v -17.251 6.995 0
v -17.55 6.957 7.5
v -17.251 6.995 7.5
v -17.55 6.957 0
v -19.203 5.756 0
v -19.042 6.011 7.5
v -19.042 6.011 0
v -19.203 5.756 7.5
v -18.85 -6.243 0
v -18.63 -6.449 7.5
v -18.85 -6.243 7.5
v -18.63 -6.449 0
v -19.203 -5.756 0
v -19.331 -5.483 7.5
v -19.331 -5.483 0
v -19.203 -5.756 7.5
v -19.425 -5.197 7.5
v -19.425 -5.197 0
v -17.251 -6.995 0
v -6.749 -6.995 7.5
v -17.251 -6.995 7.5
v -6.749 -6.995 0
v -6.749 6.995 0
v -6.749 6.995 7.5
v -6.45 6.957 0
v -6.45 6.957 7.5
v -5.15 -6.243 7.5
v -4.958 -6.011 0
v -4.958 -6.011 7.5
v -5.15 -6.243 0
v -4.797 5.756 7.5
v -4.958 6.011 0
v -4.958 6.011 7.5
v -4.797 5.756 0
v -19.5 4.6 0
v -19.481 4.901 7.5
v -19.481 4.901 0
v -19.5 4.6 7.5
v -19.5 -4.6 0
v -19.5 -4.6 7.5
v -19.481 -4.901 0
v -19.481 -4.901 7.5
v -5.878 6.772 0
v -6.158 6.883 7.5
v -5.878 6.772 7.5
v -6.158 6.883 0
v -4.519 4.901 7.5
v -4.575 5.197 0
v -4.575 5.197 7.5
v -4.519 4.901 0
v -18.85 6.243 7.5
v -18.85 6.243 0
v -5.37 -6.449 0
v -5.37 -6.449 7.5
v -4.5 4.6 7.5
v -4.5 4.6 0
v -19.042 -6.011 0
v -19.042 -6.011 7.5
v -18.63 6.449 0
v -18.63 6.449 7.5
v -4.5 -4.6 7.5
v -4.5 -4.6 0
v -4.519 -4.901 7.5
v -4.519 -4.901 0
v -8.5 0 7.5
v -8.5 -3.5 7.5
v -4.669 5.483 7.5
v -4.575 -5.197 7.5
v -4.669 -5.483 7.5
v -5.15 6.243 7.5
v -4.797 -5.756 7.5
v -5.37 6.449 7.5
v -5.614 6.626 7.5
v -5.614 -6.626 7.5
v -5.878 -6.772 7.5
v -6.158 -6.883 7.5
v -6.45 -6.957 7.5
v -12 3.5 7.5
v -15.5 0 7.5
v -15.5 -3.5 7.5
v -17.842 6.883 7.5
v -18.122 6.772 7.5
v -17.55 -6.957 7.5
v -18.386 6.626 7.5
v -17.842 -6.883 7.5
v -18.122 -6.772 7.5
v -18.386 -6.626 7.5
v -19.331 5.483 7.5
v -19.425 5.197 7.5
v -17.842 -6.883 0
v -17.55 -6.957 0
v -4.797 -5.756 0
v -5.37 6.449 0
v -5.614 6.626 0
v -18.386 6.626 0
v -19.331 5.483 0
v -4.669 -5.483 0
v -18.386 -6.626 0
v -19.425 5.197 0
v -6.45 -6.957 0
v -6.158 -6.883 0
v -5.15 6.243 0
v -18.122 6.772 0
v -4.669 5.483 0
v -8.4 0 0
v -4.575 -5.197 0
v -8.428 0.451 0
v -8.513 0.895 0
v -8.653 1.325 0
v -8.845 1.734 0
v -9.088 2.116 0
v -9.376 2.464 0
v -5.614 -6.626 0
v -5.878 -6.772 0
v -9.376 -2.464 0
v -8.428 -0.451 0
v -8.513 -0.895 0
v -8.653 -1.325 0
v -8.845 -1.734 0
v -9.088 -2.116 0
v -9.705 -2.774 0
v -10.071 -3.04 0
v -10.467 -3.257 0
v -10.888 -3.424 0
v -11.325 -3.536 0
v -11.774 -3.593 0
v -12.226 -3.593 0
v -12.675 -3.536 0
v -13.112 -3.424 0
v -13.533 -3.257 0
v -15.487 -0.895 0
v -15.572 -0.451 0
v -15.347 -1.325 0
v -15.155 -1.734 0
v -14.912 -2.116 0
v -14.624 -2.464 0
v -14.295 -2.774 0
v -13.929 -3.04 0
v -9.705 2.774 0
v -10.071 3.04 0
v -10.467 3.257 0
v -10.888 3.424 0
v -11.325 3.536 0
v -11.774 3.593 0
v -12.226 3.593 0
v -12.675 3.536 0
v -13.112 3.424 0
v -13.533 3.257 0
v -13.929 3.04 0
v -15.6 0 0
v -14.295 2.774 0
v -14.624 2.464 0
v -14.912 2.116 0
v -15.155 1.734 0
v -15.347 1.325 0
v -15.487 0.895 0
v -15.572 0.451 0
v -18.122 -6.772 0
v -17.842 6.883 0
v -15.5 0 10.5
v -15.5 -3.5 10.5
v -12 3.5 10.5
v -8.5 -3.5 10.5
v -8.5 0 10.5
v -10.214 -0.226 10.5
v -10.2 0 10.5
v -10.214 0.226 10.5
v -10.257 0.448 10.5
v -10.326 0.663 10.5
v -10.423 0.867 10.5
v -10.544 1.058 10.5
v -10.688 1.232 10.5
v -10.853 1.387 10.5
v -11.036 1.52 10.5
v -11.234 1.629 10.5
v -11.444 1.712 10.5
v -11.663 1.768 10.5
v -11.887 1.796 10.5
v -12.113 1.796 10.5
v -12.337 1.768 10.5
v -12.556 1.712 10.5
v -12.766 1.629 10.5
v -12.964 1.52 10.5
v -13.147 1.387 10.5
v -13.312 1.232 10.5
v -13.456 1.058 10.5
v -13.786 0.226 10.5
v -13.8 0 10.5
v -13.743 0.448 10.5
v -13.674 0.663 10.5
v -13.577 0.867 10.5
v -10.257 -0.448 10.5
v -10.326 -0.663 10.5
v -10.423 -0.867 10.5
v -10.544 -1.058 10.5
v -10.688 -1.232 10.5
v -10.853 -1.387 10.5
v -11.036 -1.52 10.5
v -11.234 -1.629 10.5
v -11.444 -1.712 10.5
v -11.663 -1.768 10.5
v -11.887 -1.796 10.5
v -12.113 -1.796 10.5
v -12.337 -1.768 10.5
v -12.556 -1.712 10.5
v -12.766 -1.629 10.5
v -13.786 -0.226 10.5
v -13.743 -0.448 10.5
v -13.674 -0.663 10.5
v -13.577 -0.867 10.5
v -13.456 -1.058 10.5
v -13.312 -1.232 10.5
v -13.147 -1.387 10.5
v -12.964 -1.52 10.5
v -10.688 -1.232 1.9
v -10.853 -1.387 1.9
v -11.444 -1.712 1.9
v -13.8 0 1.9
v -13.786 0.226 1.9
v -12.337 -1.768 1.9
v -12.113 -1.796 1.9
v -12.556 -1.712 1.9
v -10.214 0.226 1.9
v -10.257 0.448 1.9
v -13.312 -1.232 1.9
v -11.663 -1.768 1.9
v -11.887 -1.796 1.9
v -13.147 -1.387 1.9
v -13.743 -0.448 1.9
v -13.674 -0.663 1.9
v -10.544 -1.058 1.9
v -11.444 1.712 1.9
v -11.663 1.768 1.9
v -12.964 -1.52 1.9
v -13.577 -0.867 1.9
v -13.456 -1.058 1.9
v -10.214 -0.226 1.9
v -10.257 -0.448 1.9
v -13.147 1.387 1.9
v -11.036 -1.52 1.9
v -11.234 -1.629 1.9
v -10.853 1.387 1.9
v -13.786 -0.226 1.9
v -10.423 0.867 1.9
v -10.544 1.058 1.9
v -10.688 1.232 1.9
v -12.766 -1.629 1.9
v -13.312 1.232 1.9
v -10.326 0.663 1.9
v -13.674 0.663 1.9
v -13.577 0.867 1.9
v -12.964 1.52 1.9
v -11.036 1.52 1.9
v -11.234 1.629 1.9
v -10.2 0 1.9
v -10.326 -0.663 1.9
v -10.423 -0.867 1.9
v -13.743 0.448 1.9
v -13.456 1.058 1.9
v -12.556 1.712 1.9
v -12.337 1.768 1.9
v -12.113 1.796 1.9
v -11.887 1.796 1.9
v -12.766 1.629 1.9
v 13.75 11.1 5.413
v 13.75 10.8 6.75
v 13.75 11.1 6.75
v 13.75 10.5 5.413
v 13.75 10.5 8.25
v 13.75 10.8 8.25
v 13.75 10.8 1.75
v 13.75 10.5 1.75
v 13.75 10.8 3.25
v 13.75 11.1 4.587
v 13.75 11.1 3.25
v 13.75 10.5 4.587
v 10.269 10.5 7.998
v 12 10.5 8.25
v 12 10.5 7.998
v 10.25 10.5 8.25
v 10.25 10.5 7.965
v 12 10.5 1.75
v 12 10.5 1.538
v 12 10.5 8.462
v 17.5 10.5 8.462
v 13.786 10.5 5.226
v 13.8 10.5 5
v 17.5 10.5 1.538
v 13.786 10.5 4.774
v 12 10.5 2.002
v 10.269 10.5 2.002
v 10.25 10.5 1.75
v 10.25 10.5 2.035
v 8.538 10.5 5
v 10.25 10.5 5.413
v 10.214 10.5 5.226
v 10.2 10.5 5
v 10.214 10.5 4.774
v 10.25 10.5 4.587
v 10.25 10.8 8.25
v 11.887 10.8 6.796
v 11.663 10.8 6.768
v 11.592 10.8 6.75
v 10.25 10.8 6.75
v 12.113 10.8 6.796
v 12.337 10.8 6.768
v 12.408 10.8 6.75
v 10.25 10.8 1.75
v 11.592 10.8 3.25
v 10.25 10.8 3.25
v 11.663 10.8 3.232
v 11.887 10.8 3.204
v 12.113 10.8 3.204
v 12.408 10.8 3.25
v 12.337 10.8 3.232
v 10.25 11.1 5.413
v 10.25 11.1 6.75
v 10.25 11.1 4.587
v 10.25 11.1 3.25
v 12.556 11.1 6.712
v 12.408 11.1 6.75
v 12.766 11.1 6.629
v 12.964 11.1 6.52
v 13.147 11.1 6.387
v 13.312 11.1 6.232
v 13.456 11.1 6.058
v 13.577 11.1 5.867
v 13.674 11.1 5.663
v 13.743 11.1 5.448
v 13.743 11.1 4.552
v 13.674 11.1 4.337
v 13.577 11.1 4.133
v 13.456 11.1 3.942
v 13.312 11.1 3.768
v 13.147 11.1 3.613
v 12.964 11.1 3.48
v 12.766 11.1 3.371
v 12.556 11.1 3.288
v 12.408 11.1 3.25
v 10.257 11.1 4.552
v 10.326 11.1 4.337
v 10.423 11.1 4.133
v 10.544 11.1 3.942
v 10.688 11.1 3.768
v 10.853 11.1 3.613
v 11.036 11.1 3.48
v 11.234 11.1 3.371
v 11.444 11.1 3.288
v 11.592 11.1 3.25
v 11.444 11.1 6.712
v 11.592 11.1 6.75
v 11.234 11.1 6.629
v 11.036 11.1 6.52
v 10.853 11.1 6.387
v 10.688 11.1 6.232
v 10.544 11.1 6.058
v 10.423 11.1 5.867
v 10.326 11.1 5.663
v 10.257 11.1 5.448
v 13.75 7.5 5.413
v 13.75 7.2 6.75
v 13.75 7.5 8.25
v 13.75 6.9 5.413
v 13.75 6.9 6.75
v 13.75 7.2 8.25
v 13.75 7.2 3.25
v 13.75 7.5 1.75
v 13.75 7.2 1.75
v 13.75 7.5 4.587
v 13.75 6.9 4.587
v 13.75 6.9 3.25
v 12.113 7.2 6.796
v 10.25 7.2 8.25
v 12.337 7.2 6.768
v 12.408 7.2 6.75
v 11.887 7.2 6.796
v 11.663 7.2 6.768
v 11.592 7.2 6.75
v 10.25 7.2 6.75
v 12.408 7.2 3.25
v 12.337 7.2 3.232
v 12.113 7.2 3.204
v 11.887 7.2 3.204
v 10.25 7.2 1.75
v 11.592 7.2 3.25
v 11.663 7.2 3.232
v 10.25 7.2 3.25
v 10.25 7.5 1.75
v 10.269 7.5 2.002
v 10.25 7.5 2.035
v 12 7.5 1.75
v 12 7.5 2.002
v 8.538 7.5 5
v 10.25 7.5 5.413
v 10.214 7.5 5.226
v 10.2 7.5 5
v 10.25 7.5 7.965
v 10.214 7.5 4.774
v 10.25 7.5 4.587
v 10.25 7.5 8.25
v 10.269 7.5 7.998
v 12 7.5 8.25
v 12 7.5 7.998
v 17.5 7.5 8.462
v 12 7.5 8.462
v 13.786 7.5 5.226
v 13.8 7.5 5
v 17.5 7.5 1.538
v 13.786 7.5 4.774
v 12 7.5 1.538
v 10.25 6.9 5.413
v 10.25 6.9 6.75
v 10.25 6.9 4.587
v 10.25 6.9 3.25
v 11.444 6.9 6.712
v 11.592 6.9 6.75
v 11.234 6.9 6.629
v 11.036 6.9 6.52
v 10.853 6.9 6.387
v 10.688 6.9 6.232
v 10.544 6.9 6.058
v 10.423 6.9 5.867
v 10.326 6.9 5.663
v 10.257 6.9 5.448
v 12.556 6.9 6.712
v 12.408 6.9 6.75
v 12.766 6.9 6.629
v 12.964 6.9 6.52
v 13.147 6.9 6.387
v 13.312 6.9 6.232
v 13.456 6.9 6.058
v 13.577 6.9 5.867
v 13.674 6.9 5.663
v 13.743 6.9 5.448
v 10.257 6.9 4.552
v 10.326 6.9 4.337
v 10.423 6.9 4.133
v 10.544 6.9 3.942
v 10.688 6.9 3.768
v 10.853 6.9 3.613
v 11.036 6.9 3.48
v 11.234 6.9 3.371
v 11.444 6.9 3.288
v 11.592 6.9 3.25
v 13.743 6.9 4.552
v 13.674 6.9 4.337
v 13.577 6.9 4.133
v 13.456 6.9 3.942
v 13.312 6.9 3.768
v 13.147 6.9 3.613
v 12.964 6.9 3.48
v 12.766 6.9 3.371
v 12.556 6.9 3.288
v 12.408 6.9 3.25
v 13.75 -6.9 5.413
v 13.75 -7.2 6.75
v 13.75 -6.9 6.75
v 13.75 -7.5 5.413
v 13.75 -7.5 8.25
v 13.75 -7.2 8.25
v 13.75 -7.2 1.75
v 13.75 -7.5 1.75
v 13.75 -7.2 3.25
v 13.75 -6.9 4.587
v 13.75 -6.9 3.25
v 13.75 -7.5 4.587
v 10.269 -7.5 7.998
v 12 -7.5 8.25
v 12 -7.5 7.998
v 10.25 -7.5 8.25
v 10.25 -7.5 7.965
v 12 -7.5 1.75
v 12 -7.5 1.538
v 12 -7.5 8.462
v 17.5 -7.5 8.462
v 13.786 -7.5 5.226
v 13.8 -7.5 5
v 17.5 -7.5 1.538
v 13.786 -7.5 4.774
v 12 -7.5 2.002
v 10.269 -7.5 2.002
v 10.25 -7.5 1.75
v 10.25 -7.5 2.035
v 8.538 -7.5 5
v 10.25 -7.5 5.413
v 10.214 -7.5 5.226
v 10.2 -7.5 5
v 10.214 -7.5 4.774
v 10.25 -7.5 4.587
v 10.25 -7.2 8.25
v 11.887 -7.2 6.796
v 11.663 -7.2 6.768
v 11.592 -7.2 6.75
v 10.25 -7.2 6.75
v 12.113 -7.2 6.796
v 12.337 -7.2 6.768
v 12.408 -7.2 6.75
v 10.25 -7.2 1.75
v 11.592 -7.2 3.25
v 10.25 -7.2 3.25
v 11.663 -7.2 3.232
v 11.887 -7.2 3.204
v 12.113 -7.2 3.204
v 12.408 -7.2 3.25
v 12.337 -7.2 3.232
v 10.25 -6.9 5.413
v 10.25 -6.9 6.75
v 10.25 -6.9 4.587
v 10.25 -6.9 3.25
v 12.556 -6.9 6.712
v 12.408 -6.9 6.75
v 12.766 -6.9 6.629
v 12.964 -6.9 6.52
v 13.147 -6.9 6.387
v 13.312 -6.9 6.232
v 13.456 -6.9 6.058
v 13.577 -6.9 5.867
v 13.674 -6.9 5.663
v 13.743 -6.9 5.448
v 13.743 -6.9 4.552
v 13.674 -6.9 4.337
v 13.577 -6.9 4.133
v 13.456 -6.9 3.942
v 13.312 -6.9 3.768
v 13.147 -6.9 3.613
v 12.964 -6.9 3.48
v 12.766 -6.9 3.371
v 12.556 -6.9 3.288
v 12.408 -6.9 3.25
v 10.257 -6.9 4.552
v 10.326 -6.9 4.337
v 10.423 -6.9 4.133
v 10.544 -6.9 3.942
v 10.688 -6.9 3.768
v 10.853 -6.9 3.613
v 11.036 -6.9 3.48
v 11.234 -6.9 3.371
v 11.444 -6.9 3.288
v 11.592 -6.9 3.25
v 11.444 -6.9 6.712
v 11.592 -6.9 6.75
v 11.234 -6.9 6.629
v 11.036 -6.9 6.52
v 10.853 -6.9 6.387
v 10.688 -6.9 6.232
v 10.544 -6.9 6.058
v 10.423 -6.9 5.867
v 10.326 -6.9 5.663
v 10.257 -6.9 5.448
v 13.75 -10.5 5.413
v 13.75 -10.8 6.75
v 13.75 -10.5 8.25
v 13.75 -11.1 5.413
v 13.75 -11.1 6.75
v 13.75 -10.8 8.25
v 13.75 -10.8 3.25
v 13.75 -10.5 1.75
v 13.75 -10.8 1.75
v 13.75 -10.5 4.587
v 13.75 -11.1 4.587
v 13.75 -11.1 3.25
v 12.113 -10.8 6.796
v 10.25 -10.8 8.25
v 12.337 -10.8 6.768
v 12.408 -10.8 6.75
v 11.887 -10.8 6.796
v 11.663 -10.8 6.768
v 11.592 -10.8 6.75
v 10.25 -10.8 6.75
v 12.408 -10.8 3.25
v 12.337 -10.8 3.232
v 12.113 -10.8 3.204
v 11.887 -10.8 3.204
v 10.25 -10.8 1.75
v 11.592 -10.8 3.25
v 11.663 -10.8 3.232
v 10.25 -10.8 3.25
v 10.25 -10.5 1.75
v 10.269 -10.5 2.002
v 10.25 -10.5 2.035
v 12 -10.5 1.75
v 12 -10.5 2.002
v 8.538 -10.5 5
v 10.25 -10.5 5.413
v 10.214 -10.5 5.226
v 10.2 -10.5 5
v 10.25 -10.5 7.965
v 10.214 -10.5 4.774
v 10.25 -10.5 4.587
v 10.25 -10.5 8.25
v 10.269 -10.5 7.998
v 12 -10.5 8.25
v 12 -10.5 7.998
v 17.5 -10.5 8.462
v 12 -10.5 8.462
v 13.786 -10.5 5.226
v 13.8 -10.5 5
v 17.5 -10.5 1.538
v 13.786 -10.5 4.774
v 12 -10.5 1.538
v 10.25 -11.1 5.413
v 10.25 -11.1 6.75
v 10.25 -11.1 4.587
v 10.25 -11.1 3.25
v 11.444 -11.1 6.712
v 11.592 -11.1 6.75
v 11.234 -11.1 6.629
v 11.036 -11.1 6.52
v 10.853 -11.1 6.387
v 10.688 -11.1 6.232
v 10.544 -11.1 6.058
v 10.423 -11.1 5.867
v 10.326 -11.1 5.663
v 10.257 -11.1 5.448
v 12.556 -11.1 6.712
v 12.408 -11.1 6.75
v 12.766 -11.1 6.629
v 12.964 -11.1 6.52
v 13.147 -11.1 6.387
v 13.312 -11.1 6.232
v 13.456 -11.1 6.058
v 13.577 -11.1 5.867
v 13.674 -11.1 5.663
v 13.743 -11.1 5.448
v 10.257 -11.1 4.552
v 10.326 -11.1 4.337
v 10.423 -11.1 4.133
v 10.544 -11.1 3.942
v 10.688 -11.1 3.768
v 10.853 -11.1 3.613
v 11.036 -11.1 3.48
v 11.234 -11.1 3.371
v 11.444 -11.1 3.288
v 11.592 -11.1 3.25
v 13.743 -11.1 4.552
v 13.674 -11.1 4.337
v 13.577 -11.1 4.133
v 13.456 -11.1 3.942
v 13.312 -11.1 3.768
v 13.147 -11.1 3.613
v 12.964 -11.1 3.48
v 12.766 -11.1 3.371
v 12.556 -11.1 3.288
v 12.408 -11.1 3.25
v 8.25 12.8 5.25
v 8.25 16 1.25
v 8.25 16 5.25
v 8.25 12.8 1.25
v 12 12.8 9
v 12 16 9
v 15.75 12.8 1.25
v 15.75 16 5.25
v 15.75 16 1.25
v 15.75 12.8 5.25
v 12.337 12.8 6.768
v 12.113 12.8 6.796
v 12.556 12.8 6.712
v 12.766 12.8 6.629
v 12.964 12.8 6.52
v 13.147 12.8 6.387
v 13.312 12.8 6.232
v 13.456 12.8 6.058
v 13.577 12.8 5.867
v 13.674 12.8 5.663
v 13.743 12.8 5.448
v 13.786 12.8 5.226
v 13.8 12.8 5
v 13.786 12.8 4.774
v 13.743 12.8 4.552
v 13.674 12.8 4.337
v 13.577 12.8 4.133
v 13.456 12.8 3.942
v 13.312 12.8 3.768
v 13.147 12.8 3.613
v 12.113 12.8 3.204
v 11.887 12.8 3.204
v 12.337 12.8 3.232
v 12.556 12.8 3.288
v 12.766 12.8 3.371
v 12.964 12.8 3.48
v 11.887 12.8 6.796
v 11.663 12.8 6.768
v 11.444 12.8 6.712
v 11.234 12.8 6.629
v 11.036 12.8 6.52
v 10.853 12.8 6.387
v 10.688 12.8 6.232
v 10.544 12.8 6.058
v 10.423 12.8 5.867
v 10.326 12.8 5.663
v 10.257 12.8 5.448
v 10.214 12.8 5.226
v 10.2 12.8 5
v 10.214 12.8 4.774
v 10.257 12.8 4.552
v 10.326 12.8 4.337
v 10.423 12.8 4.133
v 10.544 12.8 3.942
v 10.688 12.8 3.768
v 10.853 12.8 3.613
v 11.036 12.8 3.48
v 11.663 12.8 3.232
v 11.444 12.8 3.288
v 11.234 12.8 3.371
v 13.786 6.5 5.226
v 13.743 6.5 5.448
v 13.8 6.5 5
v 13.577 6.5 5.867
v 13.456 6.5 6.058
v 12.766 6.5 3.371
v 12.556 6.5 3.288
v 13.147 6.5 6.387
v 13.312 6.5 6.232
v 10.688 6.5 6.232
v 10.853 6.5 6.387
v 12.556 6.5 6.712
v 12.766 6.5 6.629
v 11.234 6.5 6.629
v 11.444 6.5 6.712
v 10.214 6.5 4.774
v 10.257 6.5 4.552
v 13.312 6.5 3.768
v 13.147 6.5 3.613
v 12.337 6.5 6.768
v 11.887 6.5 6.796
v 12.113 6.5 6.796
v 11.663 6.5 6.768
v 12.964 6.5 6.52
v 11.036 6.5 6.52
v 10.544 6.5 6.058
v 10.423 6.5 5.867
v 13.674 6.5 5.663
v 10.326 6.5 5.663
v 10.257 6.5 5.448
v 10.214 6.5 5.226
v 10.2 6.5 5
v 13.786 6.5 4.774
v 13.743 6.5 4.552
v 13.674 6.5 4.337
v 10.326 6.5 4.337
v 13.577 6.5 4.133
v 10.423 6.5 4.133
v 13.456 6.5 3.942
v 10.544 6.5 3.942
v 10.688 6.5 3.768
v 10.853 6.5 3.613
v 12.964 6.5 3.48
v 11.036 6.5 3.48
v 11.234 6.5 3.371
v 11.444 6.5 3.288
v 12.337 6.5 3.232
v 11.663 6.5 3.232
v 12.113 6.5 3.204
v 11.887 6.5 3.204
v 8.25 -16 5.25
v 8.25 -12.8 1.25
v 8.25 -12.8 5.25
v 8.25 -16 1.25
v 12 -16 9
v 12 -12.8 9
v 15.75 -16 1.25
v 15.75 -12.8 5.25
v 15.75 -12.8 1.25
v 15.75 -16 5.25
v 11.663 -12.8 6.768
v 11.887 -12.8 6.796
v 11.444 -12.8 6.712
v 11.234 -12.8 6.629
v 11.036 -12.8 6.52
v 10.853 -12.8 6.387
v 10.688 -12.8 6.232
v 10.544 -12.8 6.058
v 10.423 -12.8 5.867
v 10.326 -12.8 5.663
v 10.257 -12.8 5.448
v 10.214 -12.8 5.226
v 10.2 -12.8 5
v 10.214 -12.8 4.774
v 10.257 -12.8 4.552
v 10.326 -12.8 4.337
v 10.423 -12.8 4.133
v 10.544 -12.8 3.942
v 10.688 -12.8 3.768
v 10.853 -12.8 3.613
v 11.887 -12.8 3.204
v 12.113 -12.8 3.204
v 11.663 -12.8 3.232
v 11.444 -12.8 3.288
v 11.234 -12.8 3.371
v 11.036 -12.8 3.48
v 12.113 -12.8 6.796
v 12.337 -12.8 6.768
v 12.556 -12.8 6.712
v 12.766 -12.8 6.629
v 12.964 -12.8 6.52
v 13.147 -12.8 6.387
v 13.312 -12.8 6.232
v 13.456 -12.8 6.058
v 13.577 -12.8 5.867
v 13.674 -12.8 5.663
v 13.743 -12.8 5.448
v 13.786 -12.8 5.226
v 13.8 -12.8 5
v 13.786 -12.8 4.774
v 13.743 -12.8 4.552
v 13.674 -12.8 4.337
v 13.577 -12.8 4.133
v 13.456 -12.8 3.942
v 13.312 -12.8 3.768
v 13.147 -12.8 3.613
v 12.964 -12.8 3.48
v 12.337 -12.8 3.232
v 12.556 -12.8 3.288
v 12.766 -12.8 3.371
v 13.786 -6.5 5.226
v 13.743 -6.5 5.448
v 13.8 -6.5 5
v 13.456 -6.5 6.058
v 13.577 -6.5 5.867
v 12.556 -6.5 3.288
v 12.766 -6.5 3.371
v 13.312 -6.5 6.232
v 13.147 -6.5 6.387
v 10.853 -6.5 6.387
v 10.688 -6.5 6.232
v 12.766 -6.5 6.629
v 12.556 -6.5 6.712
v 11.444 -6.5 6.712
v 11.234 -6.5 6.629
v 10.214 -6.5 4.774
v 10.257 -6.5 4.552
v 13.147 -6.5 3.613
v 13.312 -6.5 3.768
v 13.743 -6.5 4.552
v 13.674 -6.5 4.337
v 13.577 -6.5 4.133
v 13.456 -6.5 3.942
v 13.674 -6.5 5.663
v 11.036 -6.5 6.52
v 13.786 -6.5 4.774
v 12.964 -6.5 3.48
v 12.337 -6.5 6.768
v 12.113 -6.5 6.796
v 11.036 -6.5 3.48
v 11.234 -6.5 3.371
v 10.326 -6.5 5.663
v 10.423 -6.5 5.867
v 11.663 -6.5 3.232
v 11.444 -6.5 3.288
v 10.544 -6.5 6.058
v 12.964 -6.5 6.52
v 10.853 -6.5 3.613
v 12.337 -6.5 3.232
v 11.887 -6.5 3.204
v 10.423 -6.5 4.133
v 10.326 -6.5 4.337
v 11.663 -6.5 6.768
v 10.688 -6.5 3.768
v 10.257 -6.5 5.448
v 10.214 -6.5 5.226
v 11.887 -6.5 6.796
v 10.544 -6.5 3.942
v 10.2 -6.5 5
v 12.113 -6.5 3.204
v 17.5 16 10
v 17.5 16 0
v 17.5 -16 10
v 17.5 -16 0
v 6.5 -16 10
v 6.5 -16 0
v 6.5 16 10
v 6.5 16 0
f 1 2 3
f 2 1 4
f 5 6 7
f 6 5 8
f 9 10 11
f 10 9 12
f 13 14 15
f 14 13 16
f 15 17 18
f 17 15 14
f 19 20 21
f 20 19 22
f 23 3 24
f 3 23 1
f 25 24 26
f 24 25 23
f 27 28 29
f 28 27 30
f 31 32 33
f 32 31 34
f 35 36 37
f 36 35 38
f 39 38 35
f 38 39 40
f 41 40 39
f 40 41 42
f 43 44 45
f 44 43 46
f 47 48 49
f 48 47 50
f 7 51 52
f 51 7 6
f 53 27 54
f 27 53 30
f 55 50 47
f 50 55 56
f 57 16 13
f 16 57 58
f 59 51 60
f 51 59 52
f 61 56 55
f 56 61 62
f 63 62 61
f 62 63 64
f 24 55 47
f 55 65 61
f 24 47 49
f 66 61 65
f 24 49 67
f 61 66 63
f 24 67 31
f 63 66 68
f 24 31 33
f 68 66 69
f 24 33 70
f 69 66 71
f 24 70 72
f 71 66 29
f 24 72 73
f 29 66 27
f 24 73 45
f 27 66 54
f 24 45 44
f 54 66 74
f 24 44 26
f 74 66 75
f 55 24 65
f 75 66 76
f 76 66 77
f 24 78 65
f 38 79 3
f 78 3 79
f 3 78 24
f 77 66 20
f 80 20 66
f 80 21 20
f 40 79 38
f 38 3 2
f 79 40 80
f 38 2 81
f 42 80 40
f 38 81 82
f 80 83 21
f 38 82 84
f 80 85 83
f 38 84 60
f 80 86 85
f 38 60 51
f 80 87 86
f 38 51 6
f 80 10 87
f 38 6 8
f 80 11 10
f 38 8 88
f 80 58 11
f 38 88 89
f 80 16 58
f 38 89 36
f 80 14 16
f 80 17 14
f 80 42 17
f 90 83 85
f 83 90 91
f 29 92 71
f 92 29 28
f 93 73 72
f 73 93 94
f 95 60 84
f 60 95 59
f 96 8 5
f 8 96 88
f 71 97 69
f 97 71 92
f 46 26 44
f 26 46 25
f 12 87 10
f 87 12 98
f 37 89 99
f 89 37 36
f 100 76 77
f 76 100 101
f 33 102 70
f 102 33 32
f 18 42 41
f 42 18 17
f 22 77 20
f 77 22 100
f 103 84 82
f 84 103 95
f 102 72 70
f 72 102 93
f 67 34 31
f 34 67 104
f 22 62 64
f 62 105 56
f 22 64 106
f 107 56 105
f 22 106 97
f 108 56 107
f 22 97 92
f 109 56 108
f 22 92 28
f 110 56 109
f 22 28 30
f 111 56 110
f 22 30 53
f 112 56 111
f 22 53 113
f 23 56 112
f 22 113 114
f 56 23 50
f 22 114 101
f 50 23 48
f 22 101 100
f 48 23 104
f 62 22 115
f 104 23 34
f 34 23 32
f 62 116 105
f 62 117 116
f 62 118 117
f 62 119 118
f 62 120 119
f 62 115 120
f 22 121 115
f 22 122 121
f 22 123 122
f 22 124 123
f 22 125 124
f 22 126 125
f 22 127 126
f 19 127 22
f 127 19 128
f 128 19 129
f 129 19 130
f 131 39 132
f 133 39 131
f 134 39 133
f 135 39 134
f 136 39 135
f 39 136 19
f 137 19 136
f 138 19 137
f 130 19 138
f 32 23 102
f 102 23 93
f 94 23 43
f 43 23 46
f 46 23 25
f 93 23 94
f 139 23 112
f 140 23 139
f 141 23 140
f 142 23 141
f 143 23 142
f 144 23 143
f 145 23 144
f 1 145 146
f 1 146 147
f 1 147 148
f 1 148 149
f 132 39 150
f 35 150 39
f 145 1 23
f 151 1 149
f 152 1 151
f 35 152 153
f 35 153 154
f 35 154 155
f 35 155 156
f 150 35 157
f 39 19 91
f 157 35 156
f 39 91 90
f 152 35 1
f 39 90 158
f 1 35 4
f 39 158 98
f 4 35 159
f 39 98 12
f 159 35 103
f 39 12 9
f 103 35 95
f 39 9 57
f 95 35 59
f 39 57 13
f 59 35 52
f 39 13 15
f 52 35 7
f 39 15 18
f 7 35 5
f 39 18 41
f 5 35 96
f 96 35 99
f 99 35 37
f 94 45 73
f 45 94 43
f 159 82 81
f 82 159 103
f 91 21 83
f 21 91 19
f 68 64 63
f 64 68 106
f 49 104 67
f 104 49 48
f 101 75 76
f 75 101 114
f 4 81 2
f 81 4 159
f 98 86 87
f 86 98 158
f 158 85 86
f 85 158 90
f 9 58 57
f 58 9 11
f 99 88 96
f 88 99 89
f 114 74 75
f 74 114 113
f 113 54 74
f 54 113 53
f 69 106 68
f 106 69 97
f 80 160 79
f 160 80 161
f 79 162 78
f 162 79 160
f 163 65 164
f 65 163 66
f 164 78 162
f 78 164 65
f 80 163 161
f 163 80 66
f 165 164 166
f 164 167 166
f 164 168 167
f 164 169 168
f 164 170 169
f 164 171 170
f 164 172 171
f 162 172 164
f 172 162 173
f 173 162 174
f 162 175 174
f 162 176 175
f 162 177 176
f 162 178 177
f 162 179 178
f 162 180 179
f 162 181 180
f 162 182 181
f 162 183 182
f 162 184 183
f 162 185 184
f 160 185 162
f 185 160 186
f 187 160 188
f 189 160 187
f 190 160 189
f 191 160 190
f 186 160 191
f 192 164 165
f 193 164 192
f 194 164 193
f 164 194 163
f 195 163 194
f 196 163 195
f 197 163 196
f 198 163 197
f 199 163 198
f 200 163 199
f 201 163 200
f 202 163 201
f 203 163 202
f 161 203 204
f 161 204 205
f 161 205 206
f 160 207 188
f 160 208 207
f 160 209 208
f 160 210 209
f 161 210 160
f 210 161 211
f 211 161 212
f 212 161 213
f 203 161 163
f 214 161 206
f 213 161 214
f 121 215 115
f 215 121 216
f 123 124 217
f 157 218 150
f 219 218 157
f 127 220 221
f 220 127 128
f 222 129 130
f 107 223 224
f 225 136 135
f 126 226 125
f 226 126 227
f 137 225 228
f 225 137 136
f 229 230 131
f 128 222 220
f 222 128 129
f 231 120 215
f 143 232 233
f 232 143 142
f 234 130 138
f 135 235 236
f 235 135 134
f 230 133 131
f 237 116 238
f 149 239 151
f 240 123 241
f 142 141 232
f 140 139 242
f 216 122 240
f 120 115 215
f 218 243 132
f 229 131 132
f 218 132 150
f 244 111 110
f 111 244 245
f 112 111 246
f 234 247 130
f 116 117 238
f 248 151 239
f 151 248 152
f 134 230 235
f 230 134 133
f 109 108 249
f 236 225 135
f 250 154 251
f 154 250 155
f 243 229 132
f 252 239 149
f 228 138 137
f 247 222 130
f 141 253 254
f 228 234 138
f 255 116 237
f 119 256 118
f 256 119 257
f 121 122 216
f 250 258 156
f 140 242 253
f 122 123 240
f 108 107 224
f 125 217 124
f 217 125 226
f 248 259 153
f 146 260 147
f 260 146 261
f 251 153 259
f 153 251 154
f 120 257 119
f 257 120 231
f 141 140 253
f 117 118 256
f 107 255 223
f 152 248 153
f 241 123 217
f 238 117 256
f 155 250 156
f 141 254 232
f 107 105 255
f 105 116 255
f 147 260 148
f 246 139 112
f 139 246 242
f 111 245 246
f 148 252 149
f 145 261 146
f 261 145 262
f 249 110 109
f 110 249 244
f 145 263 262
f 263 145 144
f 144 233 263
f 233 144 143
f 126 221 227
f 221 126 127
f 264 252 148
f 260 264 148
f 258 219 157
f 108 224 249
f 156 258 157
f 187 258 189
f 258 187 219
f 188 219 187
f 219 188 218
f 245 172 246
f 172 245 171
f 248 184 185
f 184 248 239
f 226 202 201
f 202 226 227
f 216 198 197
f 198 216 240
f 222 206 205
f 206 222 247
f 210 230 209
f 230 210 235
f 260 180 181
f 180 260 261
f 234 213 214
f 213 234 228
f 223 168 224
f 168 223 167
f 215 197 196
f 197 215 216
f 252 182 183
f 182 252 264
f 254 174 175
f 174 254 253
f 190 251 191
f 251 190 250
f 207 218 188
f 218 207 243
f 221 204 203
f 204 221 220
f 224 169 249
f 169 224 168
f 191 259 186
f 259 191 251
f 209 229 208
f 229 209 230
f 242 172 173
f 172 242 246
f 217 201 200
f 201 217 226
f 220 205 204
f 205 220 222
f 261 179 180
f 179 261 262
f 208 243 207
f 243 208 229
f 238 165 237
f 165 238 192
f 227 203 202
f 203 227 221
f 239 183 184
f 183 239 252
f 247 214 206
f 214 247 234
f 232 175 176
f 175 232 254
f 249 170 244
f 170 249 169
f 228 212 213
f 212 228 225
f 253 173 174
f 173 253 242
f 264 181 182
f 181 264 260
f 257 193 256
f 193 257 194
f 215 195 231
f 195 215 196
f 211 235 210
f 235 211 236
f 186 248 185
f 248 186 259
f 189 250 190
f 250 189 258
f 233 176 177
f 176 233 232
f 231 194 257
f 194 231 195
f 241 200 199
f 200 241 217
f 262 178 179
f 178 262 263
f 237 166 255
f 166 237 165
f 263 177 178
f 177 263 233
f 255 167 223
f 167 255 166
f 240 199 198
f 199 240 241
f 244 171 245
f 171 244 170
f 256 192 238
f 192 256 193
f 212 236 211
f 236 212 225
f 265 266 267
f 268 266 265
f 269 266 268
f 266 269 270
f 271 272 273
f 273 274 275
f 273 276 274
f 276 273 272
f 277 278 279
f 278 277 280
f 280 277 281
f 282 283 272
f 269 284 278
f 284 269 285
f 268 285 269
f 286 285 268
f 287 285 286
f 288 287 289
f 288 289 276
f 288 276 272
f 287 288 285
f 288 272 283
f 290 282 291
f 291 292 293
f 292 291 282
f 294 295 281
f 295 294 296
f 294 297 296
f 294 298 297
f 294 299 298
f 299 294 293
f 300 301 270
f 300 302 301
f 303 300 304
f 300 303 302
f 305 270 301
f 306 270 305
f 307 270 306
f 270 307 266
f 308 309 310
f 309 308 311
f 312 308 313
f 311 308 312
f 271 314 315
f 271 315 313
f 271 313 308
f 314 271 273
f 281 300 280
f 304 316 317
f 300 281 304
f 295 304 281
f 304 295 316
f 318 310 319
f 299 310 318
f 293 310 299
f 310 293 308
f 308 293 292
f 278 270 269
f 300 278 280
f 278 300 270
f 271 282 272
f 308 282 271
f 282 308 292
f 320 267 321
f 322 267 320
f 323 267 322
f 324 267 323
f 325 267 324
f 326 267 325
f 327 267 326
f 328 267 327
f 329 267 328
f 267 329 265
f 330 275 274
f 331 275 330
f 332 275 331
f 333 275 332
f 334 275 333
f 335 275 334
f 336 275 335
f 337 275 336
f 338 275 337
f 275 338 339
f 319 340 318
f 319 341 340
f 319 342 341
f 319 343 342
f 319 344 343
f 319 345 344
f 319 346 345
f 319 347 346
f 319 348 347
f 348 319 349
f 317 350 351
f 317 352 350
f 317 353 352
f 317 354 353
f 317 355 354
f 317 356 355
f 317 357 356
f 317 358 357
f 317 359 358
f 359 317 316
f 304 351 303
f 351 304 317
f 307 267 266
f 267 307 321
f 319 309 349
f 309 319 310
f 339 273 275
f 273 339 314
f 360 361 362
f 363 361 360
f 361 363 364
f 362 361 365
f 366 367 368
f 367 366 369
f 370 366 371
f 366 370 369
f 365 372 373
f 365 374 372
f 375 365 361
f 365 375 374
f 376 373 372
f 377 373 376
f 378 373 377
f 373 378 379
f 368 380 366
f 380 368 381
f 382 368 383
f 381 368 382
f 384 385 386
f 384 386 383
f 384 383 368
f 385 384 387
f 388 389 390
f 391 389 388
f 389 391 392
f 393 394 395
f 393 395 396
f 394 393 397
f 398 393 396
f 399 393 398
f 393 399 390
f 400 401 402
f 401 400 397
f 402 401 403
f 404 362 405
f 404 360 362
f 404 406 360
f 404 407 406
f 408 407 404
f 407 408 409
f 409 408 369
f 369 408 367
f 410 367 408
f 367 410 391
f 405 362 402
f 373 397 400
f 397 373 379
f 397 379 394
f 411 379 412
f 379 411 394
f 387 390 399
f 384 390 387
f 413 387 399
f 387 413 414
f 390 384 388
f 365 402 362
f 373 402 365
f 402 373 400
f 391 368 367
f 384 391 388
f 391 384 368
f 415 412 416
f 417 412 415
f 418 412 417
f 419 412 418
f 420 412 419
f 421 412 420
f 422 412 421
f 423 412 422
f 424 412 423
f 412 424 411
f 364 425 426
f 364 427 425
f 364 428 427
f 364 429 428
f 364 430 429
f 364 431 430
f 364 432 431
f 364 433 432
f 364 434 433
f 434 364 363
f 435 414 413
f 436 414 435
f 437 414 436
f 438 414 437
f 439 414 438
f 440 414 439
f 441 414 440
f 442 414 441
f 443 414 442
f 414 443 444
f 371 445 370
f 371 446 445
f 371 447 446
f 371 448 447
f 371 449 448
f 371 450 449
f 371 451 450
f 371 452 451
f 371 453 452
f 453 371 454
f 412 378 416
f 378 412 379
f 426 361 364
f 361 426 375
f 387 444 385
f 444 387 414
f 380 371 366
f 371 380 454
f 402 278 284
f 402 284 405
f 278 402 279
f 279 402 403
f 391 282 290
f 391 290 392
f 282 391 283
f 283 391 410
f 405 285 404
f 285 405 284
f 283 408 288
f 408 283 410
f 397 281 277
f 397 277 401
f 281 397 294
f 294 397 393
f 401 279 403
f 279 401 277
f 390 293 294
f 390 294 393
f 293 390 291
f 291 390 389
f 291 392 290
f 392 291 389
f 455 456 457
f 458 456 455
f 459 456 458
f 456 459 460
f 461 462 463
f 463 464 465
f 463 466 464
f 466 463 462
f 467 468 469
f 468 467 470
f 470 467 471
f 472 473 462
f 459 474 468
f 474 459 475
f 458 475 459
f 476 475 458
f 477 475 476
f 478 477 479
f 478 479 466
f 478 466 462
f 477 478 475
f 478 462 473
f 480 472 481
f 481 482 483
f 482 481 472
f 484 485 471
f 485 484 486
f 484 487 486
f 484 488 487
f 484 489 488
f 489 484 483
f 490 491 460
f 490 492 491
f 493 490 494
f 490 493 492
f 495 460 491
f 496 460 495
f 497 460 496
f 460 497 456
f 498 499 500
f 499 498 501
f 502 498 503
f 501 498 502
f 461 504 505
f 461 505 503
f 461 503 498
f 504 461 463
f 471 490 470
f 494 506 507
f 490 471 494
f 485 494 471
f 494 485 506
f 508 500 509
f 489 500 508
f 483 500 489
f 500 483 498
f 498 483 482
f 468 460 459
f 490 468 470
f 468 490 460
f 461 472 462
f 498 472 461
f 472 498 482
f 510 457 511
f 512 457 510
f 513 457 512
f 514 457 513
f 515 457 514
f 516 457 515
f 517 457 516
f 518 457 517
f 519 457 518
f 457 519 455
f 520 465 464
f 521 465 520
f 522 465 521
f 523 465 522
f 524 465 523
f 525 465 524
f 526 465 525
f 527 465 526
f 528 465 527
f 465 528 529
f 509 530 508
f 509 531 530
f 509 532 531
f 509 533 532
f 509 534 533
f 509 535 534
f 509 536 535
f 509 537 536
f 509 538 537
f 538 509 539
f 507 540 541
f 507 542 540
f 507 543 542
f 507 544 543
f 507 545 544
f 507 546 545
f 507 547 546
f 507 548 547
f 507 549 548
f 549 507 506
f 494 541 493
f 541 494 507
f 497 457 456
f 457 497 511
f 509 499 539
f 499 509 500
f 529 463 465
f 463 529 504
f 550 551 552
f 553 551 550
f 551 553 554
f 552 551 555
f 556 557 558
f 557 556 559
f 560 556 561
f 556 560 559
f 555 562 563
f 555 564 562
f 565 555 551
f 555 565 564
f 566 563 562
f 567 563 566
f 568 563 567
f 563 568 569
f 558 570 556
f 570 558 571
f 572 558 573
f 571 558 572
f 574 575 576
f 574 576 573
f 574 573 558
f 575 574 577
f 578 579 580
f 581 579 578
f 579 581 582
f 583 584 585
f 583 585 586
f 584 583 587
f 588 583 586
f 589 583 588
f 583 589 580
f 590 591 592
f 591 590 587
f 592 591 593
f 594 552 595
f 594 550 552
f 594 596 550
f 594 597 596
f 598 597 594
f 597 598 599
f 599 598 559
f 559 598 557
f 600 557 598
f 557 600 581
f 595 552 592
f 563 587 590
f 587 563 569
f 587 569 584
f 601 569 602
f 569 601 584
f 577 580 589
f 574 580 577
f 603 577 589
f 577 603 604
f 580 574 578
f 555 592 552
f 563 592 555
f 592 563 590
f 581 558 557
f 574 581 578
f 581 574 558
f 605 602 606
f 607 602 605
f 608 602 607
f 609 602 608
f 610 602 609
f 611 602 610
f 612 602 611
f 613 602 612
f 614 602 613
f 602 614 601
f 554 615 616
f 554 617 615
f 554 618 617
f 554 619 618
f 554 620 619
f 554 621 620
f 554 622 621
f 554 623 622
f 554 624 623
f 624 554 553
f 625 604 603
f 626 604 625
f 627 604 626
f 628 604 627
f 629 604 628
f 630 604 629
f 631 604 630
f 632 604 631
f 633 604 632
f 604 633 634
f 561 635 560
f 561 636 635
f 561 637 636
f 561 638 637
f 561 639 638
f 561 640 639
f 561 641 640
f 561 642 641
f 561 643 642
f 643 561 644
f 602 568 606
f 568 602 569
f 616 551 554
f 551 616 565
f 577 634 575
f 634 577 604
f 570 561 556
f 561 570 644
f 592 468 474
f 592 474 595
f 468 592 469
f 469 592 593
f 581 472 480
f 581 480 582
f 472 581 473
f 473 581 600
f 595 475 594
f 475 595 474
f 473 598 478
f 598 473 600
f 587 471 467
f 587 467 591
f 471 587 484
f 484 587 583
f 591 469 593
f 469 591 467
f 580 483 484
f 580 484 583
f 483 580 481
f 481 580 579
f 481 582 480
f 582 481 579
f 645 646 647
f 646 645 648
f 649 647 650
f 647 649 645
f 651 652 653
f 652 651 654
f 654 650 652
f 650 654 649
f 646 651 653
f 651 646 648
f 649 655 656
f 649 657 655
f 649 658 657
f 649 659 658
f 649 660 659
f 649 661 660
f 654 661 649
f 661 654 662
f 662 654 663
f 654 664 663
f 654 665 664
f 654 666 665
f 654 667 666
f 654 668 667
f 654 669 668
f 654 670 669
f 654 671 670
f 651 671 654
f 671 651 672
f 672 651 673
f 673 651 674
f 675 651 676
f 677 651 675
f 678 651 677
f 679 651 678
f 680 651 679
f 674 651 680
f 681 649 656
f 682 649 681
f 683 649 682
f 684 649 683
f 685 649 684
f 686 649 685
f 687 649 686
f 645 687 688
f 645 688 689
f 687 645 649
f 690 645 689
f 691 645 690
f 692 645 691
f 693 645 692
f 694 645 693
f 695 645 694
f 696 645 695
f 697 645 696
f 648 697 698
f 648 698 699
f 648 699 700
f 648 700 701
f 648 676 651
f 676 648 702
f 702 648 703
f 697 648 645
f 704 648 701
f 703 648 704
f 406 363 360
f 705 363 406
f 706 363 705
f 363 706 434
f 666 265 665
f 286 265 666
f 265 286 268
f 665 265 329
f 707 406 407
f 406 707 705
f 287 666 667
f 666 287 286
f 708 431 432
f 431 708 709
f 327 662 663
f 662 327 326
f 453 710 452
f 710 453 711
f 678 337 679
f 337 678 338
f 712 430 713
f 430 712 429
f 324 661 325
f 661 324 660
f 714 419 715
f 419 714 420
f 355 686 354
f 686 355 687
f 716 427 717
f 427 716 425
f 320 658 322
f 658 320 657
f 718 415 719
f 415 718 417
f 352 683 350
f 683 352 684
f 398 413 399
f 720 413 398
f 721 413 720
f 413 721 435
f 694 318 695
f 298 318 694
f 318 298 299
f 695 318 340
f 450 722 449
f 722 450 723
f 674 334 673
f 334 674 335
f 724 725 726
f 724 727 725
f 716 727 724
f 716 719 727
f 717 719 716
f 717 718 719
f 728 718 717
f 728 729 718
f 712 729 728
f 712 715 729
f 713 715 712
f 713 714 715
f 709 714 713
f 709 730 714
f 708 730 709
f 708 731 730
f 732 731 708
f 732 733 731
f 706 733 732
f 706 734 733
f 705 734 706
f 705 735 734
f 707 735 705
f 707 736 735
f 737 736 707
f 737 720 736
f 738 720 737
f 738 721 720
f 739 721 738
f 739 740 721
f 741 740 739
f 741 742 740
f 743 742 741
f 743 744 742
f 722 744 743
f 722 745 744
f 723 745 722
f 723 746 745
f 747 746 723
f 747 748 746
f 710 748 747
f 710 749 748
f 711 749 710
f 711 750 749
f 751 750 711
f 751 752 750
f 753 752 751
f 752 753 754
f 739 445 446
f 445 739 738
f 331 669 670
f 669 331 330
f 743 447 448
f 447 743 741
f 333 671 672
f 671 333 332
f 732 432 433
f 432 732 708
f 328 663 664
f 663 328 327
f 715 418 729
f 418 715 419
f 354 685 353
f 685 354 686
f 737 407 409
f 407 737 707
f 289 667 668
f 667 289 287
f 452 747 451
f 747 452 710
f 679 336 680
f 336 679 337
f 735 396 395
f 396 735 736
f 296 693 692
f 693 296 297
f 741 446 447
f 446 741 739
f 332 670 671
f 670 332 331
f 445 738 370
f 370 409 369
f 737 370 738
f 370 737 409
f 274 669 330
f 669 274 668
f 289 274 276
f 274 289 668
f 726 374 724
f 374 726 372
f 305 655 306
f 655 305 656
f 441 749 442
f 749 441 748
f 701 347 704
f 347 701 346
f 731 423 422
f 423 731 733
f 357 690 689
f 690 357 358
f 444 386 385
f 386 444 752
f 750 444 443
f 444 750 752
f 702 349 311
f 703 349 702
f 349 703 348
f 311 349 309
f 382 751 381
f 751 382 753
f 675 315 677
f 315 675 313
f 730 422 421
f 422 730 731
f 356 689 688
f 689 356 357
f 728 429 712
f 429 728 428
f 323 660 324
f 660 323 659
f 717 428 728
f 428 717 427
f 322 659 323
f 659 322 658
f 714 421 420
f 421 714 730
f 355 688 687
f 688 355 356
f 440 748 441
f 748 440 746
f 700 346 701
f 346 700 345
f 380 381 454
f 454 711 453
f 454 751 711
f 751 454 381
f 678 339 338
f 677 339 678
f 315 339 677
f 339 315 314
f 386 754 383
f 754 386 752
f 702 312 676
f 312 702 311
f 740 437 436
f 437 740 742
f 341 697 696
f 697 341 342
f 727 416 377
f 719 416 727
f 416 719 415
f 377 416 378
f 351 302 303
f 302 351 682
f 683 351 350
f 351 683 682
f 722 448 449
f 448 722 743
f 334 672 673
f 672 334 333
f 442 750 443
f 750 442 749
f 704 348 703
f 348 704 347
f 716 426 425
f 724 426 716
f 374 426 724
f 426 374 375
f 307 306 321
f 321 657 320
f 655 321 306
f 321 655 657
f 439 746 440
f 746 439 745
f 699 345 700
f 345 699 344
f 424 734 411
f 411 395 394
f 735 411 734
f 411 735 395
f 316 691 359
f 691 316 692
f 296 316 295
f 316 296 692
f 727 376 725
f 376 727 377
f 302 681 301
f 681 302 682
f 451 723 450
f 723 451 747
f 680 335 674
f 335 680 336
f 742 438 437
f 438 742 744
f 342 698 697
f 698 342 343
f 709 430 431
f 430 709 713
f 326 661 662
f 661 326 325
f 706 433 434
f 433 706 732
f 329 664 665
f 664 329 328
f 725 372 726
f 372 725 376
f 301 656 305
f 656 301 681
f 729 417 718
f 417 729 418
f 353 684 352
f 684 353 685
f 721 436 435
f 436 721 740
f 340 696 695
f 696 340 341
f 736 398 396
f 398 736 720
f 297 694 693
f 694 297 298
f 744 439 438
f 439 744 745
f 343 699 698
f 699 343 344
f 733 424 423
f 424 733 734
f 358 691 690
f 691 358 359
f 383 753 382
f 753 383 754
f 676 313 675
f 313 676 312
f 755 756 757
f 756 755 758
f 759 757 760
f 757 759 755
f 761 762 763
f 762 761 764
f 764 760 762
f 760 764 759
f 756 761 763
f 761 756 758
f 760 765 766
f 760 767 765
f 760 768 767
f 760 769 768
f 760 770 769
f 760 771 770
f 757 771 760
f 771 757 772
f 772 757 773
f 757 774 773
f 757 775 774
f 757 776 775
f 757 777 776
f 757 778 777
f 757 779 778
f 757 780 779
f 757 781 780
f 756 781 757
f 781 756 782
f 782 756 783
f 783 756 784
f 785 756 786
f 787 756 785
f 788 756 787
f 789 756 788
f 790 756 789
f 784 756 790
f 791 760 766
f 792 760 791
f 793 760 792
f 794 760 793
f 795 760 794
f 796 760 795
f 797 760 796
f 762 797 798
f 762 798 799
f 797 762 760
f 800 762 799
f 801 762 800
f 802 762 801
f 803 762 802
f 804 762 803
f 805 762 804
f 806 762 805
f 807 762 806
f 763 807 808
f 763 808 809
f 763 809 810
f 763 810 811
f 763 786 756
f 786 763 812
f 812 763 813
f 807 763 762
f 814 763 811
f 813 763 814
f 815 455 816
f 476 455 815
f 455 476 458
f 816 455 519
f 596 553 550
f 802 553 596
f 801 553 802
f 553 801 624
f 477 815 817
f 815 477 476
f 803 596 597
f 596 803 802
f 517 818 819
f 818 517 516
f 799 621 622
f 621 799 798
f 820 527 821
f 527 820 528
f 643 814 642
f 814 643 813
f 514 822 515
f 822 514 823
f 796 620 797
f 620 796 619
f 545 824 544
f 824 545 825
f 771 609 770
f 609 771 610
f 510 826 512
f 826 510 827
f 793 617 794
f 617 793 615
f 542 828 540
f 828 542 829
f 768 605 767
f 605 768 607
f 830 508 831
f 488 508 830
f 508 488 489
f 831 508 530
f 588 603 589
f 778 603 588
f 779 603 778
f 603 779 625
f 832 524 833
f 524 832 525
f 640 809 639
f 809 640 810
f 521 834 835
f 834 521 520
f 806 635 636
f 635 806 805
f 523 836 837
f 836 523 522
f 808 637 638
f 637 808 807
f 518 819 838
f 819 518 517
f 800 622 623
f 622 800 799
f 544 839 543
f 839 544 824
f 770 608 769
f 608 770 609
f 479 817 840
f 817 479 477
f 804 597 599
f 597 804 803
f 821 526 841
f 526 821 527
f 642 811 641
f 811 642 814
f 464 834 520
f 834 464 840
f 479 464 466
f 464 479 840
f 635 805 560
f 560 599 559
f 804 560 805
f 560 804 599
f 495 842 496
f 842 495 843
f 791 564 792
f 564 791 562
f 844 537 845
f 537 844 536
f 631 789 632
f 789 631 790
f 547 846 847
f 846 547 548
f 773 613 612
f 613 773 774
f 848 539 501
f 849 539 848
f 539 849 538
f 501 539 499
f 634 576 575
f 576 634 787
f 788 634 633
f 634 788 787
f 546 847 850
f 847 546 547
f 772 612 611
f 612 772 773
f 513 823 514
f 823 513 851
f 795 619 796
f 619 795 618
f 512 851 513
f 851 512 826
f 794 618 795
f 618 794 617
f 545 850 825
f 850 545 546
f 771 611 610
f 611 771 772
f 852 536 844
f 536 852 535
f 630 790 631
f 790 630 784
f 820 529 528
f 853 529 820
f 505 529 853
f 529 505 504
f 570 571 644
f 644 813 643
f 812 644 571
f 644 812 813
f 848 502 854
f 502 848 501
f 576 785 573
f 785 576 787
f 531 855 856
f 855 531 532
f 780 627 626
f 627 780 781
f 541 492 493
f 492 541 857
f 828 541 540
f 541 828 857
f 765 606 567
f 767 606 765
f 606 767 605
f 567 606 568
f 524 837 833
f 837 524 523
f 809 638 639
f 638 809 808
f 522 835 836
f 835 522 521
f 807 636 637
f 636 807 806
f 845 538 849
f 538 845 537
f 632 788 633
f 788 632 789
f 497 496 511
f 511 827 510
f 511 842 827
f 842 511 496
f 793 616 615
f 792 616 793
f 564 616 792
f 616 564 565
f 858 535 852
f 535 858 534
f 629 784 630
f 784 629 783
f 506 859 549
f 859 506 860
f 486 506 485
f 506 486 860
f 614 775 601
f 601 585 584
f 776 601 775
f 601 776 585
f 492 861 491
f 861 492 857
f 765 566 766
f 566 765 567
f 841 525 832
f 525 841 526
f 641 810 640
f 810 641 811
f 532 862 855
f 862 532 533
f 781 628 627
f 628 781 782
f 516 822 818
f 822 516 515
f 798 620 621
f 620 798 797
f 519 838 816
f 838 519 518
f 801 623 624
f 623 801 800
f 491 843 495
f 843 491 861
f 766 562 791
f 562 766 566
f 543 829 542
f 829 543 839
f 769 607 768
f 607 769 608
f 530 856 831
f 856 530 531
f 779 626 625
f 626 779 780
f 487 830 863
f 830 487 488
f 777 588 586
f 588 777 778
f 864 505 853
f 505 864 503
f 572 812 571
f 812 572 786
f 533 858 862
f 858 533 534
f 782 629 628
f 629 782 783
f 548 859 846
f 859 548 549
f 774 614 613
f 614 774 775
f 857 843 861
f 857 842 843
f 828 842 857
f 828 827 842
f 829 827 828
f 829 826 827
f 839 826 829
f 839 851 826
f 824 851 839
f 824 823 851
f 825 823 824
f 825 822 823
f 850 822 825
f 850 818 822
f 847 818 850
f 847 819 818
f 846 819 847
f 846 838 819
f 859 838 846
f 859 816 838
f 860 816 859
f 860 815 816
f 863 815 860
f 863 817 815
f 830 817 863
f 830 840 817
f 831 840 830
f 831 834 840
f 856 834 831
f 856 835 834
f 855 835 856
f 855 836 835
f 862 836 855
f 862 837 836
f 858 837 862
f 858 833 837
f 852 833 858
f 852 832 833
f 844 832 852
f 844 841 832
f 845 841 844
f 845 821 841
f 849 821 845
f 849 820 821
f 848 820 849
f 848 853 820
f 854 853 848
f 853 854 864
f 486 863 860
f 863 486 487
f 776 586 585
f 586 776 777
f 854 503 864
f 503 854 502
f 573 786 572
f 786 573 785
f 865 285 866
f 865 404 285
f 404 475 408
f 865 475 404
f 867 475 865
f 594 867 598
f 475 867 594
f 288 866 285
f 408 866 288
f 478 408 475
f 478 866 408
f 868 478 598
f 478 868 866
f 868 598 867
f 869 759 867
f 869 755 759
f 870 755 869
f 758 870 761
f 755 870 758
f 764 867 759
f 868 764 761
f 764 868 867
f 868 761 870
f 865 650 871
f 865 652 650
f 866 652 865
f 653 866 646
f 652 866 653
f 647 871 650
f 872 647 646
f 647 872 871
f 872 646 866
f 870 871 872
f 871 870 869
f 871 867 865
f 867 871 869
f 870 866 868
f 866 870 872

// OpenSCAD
$fn = 50;

difference() {
	union() {
		translate(v = [-12, 0, 0]) {
			rotate(a = [0, 0, 0]) {
				difference() {
					union() {
						translate(v = [0, 0, 0]) {
							rotate(a = [0, 0, 0]) {
								difference() {
									union() {
										hull() {
											translate(v = [-5.1, 4.6, 0]) {
												cylinder(h = 7.5, r = 2.4);
											}
											translate(v = [5.1, 4.6, 0]) {
												cylinder(h = 7.5, r = 2.4);
											}
											translate(v = [-5.1, -4.6, 0]) {
												cylinder(h = 7.5, r = 2.4);
											}
											translate(v = [5.1, -4.6, 0]) {
												cylinder(h = 7.5, r = 2.4);
											}
										}
										translate(v = [0, -5, 7.4]) {
											linear_extrude(height = 3.1) {
												polygon(points = [[-3.5, 1.5], [3.5, 1.5], [3.5, 5], [0, 8.5], [-3.5, 5]]);
											}
										}
									}
									union() {
										translate(v = [0, 0.0, 0]) {
											rotate(a = [0, 180, 0]) {
												difference() {
													union() {
														translate(v = [0, 0, -16.0]) {
															cylinder(h = 16.0, r = 1.5);
														}
														translate(v = [0, 0, -1.9]) {
															cylinder(h = 1.9, r1 = 1.8, r2 = 3.6);
														}
														cylinder(h = 250, r = 3.6);
														translate(v = [0, 0, -16.0]) {
															cylinder(h = 16.0, r = 1.8);
														}
														translate(v = [0, 0, -16.0]) {
															cylinder(h = 16.0, r = 1.5);
														}
													}
													union();
												}
											}
										}
									}
								}
							}
						}
					}
					union();
				}
			}
		}
		translate(v = [12, 0, 0]) {
			rotate(a = [0, 0, 0]) {
				difference() {
					union() {
						translate(v = [0, 16.0, 0]) {
							rotate(a = [90, 0, 0]) {
								difference() {
									union() {
										translate(v = [-5.5, 0, 0]) {
											cube(size = [11.0, 10.0, 32.0]);
										}
									}
									union() {
										translate(v = [0, 5.0, 5.5]) {
											rotate(a = [0, 0, 0]) {
												difference() {
													union() {
														translate(v = [-1.75, -3.25, -0.3]) {
															cube(size = [3.5, 6.5, 0.3]);
														}
														translate(v = [-1.75, -1.75, -0.6]) {
															cube(size = [3.5, 3.5, 0.3]);
														}
														translate(v = [-1.75, -3.25, 3]) {
															cube(size = [3.5, 6.5, 0.3]);
														}
														translate(v = [-1.75, -1.75, 3.3]) {
															cube(size = [3.5, 3.5, 0.3]);
														}
														translate(v = [0.0, -3.4619999999999997, 0]) {
															cube(size = [20, 6.9239999999999995, 3]);
														}
														linear_extrude(height = 3) {
															polygon(points = [[3.4619999999999997, 0.0], [1.7310000000000003, 2.9981799479017264], [-1.7309999999999992, 2.9981799479017264], [-3.4619999999999997, 4.2397272186481365e-16], [-1.7310000000000014, -2.998179947901726], [1.7309999999999977, -2.9981799479017277]]);
														}
														translate(v = [-1.75, -3.25, -0.3]) {
															cube(size = [3.5, 6.5, 0.3]);
														}
														translate(v = [-1.75, -1.75, -0.6]) {
															cube(size = [3.5, 3.5, 0.3]);
														}
														translate(v = [-1.75, -3.25, 3]) {
															cube(size = [3.5, 6.5, 0.3]);
														}
														translate(v = [-1.75, -1.75, 3.3]) {
															cube(size = [3.5, 3.5, 0.3]);
														}
														translate(v = [-1.75, -3.25, -0.3]) {
															cube(size = [3.5, 6.5, 0.3]);
														}
														translate(v = [-1.75, -1.75, -0.6]) {
															cube(size = [3.5, 3.5, 0.3]);
														}
														translate(v = [-1.75, -3.25, 3]) {
															cube(size = [3.5, 6.5, 0.3]);
														}
														translate(v = [-1.75, -1.75, 3.3]) {
															cube(size = [3.5, 3.5, 0.3]);
														}
													}
													union();
												}
											}
										}
										translate(v = [0, 5.0, 23.5]) {
											rotate(a = [0, 0, 0]) {
												difference() {
													union() {
														translate(v = [-1.75, -3.25, -0.3]) {
															cube(size = [3.5, 6.5, 0.3]);
														}
														translate(v = [-1.75, -1.75, -0.6]) {
															cube(size = [3.5, 3.5, 0.3]);
														}
														translate(v = [-1.75, -3.25, 3]) {
															cube(size = [3.5, 6.5, 0.3]);
														}
														translate(v = [-1.75, -1.75, 3.3]) {
															cube(size = [3.5, 3.5, 0.3]);
														}
														translate(v = [0.0, -3.4619999999999997, 0]) {
															cube(size = [20, 6.9239999999999995, 3]);
														}
														linear_extrude(height = 3) {
															polygon(points = [[3.4619999999999997, 0.0], [1.7310000000000003, 2.9981799479017264], [-1.7309999999999992, 2.9981799479017264], [-3.4619999999999997, 4.2397272186481365e-16], [-1.7310000000000014, -2.998179947901726], [1.7309999999999977, -2.9981799479017277]]);
														}
														translate(v = [-1.75, -3.25, -0.3]) {
															cube(size = [3.5, 6.5, 0.3]);
														}
														translate(v = [-1.75, -1.75, -0.6]) {
															cube(size = [3.5, 3.5, 0.3]);
														}
														translate(v = [-1.75, -3.25, 3]) {
															cube(size = [3.5, 6.5, 0.3]);
														}
														translate(v = [-1.75, -1.75, 3.3]) {
															cube(size = [3.5, 3.5, 0.3]);
														}
														translate(v = [-1.75, -3.25, -0.3]) {
															cube(size = [3.5, 6.5, 0.3]);
														}
														translate(v = [-1.75, -1.75, -0.6]) {
															cube(size = [3.5, 3.5, 0.3]);
														}
														translate(v = [-1.75, -3.25, 3]) {
															cube(size = [3.5, 6.5, 0.3]);
														}
														translate(v = [-1.75, -1.75, 3.3]) {
															cube(size = [3.5, 3.5, 0.3]);
														}
													}
													union();
												}
											}
										}
										translate(v = [0, 0, -0.1]) {
											linear_extrude(height = 3.3000000000000003) {
												polygon(points = [[-3.75, 1.25], [3.75, 1.25], [3.75, 5.25], [0, 9.0], [-3.75, 5.25]]);
											}
										}
										translate(v = [0, 5.0, -0.1]) {
											cylinder(h = 9.6, r = 1.8);
										}
										translate(v = [0, 0, 28.8]) {
											linear_extrude(height = 3.3000000000000003) {
												polygon(points = [[-3.75, 1.25], [3.75, 1.25], [3.75, 5.25], [0, 9.0], [-3.75, 5.25]]);
											}
										}
										translate(v = [0, 5.0, 22.5]) {
											cylinder(h = 9.6, r = 1.8);
										}
									}
								}
							}
						}
					}
					union();
				}
			}
		}
	}
	union();
}
